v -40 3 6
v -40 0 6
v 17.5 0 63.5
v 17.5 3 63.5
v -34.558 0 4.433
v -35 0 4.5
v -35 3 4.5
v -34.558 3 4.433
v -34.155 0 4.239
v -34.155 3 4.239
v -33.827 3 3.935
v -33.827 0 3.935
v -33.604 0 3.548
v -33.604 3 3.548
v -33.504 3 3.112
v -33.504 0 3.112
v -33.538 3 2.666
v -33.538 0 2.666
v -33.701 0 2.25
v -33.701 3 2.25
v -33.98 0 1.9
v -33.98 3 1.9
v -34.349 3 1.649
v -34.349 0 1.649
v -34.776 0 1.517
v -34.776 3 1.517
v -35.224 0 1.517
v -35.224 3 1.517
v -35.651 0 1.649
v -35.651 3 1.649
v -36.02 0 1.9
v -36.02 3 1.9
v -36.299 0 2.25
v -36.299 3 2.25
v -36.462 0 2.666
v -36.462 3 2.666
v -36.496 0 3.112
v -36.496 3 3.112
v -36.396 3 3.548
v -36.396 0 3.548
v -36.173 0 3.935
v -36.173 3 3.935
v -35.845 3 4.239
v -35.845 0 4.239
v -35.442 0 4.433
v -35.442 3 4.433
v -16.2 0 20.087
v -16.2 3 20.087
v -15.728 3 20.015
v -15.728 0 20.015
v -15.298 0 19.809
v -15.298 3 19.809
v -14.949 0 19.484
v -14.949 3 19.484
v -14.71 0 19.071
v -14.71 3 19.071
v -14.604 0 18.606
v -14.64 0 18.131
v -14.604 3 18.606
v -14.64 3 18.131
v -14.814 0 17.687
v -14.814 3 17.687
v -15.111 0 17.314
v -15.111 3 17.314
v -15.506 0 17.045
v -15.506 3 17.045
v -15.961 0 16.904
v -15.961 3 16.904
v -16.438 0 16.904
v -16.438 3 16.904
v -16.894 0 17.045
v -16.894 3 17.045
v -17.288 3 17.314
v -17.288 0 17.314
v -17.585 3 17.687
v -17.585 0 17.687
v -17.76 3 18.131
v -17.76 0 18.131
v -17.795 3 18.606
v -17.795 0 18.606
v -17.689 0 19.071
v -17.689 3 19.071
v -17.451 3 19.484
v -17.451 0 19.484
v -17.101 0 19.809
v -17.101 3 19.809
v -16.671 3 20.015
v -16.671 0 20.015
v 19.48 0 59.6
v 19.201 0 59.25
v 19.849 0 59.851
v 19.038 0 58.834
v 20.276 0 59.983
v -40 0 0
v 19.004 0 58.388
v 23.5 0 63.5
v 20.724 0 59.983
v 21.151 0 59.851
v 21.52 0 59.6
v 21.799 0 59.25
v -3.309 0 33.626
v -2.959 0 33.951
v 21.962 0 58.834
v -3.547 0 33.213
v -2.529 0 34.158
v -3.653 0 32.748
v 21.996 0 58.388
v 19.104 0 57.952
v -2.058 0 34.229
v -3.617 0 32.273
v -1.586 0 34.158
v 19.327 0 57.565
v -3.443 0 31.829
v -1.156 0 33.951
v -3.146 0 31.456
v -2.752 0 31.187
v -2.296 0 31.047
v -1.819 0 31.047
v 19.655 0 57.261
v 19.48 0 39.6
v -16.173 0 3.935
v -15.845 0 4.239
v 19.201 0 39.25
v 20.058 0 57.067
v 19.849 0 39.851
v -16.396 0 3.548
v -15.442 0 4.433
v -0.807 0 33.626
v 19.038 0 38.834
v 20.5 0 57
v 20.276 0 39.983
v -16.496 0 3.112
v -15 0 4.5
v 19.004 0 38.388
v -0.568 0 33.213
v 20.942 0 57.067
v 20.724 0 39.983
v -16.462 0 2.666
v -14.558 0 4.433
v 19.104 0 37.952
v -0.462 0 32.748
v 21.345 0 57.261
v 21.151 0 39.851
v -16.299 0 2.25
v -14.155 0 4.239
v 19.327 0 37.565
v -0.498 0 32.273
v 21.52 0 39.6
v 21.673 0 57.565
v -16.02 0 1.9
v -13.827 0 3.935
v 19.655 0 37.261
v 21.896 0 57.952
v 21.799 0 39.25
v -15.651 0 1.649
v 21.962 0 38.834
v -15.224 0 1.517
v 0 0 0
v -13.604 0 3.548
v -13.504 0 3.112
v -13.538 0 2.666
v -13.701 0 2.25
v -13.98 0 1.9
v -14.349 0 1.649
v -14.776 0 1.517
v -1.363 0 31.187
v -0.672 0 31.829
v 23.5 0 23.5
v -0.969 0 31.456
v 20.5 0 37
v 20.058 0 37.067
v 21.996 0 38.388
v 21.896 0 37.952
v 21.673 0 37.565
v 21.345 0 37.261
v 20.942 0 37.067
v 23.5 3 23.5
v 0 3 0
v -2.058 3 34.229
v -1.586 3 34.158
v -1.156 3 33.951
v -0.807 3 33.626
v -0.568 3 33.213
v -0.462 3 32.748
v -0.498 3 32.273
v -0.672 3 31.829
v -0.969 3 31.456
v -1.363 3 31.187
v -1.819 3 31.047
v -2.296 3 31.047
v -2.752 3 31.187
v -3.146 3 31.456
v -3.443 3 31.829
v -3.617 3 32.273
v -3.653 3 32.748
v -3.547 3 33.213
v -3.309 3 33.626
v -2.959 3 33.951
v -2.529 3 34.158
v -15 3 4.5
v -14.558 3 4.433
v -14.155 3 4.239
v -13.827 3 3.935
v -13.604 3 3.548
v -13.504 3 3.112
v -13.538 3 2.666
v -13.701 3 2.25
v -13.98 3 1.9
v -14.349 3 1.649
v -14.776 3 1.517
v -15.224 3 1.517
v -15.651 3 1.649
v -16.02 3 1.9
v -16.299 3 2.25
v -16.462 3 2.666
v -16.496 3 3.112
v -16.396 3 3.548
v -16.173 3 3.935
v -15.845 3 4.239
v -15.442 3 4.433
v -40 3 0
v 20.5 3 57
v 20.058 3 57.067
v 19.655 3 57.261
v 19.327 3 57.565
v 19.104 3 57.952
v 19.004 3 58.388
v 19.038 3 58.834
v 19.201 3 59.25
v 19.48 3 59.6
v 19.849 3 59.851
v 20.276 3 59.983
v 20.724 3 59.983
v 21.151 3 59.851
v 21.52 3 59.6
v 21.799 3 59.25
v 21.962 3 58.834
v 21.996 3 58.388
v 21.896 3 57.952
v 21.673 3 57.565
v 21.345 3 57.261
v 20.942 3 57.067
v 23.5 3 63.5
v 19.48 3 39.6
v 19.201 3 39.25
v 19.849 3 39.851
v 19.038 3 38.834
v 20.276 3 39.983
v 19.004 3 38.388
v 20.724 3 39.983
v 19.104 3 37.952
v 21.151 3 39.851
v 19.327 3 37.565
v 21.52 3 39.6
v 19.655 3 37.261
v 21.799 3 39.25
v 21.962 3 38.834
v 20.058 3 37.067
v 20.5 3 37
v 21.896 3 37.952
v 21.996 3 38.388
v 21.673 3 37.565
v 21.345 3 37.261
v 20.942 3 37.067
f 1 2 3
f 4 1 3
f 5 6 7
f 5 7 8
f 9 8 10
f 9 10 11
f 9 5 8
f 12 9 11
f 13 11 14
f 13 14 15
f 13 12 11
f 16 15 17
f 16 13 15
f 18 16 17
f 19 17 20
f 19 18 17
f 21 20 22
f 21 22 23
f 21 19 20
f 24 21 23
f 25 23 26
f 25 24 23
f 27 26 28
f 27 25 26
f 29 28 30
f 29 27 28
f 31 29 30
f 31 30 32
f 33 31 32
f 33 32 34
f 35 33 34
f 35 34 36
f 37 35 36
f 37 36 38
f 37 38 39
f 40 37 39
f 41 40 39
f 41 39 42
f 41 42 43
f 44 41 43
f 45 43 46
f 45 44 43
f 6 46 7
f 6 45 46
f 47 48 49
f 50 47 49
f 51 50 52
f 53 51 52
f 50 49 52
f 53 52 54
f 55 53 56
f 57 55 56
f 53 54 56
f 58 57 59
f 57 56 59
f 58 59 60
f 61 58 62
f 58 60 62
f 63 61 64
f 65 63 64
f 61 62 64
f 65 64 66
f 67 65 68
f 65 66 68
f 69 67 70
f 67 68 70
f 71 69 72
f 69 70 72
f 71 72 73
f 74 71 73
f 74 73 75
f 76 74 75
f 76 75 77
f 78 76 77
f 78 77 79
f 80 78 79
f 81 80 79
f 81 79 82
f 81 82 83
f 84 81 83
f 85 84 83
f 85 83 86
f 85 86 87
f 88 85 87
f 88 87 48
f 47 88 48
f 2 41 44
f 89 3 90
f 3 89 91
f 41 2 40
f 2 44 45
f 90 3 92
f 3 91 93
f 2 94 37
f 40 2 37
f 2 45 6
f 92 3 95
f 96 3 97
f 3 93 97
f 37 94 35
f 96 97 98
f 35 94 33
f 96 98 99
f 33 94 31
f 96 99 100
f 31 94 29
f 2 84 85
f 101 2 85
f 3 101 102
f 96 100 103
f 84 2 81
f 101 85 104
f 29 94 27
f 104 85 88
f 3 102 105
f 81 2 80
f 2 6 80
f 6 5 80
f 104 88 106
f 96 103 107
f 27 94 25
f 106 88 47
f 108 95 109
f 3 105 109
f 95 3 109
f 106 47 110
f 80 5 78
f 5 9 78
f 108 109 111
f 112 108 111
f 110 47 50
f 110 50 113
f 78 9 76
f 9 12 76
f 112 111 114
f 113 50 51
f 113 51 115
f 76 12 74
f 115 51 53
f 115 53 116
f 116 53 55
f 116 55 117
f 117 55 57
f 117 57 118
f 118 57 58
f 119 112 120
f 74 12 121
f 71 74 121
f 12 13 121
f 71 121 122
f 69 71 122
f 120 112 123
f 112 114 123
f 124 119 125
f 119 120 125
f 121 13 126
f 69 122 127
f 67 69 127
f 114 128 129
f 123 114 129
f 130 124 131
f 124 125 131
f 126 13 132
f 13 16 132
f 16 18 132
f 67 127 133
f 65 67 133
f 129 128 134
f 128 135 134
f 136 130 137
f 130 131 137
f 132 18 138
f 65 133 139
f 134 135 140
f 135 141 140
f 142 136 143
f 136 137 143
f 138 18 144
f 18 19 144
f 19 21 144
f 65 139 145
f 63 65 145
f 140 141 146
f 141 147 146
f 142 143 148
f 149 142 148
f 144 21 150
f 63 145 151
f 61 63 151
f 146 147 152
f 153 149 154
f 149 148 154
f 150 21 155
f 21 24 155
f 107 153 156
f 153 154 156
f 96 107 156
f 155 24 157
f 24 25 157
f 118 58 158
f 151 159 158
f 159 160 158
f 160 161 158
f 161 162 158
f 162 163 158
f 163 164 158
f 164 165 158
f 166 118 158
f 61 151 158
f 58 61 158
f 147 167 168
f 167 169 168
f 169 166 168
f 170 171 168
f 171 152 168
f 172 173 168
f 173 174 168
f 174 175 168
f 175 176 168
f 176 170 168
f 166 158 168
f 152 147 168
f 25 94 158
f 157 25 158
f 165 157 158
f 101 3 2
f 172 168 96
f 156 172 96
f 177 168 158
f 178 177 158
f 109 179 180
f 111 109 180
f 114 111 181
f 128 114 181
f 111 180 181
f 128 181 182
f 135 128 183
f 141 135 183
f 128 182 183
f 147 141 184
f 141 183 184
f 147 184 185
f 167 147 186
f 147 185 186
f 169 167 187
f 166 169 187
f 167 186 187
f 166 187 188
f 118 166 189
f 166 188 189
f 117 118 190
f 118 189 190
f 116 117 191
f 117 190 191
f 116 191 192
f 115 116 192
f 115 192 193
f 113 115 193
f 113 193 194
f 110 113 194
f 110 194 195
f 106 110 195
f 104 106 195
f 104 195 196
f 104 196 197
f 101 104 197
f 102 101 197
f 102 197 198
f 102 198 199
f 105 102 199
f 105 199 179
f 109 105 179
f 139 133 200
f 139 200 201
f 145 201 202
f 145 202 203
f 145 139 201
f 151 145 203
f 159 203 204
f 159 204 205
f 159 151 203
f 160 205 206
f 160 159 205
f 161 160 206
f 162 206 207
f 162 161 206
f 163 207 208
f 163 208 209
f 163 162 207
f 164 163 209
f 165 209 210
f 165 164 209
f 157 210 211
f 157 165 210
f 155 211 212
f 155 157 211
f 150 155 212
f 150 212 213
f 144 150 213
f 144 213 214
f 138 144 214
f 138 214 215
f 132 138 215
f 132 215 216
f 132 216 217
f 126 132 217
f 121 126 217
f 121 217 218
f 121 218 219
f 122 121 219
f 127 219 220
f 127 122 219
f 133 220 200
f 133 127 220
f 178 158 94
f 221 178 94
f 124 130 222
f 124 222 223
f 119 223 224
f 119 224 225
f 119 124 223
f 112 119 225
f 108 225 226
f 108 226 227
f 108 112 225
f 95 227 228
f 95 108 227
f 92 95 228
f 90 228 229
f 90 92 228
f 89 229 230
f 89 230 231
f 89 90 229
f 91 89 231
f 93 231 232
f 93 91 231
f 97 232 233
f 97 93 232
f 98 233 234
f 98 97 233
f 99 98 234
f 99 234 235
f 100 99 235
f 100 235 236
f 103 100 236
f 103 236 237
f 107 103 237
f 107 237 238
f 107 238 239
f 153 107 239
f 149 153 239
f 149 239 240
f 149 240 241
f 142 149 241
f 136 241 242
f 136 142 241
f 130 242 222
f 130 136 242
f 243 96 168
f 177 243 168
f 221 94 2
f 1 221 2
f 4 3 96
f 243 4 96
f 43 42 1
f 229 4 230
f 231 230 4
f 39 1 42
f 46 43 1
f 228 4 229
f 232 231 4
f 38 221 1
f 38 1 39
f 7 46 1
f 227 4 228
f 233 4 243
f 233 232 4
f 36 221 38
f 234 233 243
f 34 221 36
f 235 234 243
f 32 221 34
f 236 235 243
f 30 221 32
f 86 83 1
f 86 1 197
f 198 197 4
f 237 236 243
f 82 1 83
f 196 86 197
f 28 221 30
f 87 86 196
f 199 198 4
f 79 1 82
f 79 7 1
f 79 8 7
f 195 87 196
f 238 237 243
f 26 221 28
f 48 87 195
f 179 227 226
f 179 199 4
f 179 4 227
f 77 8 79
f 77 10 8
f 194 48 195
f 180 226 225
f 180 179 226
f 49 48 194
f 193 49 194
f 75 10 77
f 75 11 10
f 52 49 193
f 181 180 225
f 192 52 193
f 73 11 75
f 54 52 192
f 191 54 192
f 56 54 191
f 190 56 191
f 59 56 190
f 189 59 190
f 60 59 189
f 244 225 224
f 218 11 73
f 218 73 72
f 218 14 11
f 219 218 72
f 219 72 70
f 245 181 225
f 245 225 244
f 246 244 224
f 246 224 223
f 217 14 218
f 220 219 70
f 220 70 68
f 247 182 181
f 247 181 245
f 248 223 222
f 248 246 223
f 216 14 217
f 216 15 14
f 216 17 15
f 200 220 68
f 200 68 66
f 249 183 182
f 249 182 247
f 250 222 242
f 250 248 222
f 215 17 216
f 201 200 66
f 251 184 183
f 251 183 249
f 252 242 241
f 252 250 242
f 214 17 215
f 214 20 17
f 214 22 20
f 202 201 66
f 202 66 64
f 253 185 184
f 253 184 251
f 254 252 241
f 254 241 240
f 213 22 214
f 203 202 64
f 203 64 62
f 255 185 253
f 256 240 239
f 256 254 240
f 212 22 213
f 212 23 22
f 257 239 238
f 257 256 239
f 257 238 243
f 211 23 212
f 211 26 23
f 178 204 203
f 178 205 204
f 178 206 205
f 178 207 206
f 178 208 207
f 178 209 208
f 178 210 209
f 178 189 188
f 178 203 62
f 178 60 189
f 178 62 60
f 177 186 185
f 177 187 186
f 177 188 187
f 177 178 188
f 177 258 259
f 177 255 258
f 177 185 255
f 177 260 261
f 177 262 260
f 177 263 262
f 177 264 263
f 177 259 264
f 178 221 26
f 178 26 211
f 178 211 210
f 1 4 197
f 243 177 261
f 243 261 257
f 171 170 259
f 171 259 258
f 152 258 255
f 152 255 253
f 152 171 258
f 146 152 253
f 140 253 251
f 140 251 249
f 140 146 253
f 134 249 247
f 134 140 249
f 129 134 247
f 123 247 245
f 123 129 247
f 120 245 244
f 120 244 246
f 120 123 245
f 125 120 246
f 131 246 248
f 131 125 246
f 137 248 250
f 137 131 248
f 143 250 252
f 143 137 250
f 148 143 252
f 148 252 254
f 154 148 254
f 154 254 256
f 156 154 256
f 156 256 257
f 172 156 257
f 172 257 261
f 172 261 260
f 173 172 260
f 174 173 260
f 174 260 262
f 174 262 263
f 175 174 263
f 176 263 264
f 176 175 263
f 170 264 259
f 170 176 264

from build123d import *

# Parameters (mm, degrees)
SKETCH_1_R          = 1.5
EXTRUDE_1_DEPTH     = 3
SKETCH_2_R          = 1.6
CUT_EXTRUDE_1_DEPTH = 10


with BuildPart() as part:
    # 草图1 → 凸台-拉伸1 (new body)
    with BuildSketch(Plane(origin=(0, 0, 0), x_dir=(1, 0, 0), z_dir=(0, 1, 0))):
        Polygon((0, 0), (-40, 0), (-40, -6), (17.5, -63.5), (23.5, -63.5), (23.5, -23.5), align=None)
        with Locations(Location((-35, -3, 0), (0, 0, 270))):
            Circle(SKETCH_1_R, mode=Mode.SUBTRACT)
        with Locations(Location((-15, -3, 0), (0, 0, 270))):
            Circle(SKETCH_1_R, mode=Mode.SUBTRACT)
        with Locations(Location((20.5, -58.5, 0), (0, 0, 90))):
            Circle(SKETCH_1_R, mode=Mode.SUBTRACT)
        with Locations(Location((20.5, -38.5, 0), (0, 0, 90))):
            Circle(SKETCH_1_R, mode=Mode.SUBTRACT)
    extrude(amount=EXTRUDE_1_DEPTH)

    # 草图2 → 切除-拉伸1 (cut)
    with BuildSketch(Plane(origin=(0, 3, 0), x_dir=(1, 0, 0), z_dir=(0, 1, 0))):
        with Locations(Location((-16.199747468, -18.486544033, 0), (0, 0, 270))):
            Circle(SKETCH_2_R)
        with Locations(Location((-2.057611845, -32.628679656, 0), (0, 0, 270))):
            Circle(SKETCH_2_R)
    extrude(amount=-CUT_EXTRUDE_1_DEPTH, mode=Mode.SUBTRACT)


solid = part.part
